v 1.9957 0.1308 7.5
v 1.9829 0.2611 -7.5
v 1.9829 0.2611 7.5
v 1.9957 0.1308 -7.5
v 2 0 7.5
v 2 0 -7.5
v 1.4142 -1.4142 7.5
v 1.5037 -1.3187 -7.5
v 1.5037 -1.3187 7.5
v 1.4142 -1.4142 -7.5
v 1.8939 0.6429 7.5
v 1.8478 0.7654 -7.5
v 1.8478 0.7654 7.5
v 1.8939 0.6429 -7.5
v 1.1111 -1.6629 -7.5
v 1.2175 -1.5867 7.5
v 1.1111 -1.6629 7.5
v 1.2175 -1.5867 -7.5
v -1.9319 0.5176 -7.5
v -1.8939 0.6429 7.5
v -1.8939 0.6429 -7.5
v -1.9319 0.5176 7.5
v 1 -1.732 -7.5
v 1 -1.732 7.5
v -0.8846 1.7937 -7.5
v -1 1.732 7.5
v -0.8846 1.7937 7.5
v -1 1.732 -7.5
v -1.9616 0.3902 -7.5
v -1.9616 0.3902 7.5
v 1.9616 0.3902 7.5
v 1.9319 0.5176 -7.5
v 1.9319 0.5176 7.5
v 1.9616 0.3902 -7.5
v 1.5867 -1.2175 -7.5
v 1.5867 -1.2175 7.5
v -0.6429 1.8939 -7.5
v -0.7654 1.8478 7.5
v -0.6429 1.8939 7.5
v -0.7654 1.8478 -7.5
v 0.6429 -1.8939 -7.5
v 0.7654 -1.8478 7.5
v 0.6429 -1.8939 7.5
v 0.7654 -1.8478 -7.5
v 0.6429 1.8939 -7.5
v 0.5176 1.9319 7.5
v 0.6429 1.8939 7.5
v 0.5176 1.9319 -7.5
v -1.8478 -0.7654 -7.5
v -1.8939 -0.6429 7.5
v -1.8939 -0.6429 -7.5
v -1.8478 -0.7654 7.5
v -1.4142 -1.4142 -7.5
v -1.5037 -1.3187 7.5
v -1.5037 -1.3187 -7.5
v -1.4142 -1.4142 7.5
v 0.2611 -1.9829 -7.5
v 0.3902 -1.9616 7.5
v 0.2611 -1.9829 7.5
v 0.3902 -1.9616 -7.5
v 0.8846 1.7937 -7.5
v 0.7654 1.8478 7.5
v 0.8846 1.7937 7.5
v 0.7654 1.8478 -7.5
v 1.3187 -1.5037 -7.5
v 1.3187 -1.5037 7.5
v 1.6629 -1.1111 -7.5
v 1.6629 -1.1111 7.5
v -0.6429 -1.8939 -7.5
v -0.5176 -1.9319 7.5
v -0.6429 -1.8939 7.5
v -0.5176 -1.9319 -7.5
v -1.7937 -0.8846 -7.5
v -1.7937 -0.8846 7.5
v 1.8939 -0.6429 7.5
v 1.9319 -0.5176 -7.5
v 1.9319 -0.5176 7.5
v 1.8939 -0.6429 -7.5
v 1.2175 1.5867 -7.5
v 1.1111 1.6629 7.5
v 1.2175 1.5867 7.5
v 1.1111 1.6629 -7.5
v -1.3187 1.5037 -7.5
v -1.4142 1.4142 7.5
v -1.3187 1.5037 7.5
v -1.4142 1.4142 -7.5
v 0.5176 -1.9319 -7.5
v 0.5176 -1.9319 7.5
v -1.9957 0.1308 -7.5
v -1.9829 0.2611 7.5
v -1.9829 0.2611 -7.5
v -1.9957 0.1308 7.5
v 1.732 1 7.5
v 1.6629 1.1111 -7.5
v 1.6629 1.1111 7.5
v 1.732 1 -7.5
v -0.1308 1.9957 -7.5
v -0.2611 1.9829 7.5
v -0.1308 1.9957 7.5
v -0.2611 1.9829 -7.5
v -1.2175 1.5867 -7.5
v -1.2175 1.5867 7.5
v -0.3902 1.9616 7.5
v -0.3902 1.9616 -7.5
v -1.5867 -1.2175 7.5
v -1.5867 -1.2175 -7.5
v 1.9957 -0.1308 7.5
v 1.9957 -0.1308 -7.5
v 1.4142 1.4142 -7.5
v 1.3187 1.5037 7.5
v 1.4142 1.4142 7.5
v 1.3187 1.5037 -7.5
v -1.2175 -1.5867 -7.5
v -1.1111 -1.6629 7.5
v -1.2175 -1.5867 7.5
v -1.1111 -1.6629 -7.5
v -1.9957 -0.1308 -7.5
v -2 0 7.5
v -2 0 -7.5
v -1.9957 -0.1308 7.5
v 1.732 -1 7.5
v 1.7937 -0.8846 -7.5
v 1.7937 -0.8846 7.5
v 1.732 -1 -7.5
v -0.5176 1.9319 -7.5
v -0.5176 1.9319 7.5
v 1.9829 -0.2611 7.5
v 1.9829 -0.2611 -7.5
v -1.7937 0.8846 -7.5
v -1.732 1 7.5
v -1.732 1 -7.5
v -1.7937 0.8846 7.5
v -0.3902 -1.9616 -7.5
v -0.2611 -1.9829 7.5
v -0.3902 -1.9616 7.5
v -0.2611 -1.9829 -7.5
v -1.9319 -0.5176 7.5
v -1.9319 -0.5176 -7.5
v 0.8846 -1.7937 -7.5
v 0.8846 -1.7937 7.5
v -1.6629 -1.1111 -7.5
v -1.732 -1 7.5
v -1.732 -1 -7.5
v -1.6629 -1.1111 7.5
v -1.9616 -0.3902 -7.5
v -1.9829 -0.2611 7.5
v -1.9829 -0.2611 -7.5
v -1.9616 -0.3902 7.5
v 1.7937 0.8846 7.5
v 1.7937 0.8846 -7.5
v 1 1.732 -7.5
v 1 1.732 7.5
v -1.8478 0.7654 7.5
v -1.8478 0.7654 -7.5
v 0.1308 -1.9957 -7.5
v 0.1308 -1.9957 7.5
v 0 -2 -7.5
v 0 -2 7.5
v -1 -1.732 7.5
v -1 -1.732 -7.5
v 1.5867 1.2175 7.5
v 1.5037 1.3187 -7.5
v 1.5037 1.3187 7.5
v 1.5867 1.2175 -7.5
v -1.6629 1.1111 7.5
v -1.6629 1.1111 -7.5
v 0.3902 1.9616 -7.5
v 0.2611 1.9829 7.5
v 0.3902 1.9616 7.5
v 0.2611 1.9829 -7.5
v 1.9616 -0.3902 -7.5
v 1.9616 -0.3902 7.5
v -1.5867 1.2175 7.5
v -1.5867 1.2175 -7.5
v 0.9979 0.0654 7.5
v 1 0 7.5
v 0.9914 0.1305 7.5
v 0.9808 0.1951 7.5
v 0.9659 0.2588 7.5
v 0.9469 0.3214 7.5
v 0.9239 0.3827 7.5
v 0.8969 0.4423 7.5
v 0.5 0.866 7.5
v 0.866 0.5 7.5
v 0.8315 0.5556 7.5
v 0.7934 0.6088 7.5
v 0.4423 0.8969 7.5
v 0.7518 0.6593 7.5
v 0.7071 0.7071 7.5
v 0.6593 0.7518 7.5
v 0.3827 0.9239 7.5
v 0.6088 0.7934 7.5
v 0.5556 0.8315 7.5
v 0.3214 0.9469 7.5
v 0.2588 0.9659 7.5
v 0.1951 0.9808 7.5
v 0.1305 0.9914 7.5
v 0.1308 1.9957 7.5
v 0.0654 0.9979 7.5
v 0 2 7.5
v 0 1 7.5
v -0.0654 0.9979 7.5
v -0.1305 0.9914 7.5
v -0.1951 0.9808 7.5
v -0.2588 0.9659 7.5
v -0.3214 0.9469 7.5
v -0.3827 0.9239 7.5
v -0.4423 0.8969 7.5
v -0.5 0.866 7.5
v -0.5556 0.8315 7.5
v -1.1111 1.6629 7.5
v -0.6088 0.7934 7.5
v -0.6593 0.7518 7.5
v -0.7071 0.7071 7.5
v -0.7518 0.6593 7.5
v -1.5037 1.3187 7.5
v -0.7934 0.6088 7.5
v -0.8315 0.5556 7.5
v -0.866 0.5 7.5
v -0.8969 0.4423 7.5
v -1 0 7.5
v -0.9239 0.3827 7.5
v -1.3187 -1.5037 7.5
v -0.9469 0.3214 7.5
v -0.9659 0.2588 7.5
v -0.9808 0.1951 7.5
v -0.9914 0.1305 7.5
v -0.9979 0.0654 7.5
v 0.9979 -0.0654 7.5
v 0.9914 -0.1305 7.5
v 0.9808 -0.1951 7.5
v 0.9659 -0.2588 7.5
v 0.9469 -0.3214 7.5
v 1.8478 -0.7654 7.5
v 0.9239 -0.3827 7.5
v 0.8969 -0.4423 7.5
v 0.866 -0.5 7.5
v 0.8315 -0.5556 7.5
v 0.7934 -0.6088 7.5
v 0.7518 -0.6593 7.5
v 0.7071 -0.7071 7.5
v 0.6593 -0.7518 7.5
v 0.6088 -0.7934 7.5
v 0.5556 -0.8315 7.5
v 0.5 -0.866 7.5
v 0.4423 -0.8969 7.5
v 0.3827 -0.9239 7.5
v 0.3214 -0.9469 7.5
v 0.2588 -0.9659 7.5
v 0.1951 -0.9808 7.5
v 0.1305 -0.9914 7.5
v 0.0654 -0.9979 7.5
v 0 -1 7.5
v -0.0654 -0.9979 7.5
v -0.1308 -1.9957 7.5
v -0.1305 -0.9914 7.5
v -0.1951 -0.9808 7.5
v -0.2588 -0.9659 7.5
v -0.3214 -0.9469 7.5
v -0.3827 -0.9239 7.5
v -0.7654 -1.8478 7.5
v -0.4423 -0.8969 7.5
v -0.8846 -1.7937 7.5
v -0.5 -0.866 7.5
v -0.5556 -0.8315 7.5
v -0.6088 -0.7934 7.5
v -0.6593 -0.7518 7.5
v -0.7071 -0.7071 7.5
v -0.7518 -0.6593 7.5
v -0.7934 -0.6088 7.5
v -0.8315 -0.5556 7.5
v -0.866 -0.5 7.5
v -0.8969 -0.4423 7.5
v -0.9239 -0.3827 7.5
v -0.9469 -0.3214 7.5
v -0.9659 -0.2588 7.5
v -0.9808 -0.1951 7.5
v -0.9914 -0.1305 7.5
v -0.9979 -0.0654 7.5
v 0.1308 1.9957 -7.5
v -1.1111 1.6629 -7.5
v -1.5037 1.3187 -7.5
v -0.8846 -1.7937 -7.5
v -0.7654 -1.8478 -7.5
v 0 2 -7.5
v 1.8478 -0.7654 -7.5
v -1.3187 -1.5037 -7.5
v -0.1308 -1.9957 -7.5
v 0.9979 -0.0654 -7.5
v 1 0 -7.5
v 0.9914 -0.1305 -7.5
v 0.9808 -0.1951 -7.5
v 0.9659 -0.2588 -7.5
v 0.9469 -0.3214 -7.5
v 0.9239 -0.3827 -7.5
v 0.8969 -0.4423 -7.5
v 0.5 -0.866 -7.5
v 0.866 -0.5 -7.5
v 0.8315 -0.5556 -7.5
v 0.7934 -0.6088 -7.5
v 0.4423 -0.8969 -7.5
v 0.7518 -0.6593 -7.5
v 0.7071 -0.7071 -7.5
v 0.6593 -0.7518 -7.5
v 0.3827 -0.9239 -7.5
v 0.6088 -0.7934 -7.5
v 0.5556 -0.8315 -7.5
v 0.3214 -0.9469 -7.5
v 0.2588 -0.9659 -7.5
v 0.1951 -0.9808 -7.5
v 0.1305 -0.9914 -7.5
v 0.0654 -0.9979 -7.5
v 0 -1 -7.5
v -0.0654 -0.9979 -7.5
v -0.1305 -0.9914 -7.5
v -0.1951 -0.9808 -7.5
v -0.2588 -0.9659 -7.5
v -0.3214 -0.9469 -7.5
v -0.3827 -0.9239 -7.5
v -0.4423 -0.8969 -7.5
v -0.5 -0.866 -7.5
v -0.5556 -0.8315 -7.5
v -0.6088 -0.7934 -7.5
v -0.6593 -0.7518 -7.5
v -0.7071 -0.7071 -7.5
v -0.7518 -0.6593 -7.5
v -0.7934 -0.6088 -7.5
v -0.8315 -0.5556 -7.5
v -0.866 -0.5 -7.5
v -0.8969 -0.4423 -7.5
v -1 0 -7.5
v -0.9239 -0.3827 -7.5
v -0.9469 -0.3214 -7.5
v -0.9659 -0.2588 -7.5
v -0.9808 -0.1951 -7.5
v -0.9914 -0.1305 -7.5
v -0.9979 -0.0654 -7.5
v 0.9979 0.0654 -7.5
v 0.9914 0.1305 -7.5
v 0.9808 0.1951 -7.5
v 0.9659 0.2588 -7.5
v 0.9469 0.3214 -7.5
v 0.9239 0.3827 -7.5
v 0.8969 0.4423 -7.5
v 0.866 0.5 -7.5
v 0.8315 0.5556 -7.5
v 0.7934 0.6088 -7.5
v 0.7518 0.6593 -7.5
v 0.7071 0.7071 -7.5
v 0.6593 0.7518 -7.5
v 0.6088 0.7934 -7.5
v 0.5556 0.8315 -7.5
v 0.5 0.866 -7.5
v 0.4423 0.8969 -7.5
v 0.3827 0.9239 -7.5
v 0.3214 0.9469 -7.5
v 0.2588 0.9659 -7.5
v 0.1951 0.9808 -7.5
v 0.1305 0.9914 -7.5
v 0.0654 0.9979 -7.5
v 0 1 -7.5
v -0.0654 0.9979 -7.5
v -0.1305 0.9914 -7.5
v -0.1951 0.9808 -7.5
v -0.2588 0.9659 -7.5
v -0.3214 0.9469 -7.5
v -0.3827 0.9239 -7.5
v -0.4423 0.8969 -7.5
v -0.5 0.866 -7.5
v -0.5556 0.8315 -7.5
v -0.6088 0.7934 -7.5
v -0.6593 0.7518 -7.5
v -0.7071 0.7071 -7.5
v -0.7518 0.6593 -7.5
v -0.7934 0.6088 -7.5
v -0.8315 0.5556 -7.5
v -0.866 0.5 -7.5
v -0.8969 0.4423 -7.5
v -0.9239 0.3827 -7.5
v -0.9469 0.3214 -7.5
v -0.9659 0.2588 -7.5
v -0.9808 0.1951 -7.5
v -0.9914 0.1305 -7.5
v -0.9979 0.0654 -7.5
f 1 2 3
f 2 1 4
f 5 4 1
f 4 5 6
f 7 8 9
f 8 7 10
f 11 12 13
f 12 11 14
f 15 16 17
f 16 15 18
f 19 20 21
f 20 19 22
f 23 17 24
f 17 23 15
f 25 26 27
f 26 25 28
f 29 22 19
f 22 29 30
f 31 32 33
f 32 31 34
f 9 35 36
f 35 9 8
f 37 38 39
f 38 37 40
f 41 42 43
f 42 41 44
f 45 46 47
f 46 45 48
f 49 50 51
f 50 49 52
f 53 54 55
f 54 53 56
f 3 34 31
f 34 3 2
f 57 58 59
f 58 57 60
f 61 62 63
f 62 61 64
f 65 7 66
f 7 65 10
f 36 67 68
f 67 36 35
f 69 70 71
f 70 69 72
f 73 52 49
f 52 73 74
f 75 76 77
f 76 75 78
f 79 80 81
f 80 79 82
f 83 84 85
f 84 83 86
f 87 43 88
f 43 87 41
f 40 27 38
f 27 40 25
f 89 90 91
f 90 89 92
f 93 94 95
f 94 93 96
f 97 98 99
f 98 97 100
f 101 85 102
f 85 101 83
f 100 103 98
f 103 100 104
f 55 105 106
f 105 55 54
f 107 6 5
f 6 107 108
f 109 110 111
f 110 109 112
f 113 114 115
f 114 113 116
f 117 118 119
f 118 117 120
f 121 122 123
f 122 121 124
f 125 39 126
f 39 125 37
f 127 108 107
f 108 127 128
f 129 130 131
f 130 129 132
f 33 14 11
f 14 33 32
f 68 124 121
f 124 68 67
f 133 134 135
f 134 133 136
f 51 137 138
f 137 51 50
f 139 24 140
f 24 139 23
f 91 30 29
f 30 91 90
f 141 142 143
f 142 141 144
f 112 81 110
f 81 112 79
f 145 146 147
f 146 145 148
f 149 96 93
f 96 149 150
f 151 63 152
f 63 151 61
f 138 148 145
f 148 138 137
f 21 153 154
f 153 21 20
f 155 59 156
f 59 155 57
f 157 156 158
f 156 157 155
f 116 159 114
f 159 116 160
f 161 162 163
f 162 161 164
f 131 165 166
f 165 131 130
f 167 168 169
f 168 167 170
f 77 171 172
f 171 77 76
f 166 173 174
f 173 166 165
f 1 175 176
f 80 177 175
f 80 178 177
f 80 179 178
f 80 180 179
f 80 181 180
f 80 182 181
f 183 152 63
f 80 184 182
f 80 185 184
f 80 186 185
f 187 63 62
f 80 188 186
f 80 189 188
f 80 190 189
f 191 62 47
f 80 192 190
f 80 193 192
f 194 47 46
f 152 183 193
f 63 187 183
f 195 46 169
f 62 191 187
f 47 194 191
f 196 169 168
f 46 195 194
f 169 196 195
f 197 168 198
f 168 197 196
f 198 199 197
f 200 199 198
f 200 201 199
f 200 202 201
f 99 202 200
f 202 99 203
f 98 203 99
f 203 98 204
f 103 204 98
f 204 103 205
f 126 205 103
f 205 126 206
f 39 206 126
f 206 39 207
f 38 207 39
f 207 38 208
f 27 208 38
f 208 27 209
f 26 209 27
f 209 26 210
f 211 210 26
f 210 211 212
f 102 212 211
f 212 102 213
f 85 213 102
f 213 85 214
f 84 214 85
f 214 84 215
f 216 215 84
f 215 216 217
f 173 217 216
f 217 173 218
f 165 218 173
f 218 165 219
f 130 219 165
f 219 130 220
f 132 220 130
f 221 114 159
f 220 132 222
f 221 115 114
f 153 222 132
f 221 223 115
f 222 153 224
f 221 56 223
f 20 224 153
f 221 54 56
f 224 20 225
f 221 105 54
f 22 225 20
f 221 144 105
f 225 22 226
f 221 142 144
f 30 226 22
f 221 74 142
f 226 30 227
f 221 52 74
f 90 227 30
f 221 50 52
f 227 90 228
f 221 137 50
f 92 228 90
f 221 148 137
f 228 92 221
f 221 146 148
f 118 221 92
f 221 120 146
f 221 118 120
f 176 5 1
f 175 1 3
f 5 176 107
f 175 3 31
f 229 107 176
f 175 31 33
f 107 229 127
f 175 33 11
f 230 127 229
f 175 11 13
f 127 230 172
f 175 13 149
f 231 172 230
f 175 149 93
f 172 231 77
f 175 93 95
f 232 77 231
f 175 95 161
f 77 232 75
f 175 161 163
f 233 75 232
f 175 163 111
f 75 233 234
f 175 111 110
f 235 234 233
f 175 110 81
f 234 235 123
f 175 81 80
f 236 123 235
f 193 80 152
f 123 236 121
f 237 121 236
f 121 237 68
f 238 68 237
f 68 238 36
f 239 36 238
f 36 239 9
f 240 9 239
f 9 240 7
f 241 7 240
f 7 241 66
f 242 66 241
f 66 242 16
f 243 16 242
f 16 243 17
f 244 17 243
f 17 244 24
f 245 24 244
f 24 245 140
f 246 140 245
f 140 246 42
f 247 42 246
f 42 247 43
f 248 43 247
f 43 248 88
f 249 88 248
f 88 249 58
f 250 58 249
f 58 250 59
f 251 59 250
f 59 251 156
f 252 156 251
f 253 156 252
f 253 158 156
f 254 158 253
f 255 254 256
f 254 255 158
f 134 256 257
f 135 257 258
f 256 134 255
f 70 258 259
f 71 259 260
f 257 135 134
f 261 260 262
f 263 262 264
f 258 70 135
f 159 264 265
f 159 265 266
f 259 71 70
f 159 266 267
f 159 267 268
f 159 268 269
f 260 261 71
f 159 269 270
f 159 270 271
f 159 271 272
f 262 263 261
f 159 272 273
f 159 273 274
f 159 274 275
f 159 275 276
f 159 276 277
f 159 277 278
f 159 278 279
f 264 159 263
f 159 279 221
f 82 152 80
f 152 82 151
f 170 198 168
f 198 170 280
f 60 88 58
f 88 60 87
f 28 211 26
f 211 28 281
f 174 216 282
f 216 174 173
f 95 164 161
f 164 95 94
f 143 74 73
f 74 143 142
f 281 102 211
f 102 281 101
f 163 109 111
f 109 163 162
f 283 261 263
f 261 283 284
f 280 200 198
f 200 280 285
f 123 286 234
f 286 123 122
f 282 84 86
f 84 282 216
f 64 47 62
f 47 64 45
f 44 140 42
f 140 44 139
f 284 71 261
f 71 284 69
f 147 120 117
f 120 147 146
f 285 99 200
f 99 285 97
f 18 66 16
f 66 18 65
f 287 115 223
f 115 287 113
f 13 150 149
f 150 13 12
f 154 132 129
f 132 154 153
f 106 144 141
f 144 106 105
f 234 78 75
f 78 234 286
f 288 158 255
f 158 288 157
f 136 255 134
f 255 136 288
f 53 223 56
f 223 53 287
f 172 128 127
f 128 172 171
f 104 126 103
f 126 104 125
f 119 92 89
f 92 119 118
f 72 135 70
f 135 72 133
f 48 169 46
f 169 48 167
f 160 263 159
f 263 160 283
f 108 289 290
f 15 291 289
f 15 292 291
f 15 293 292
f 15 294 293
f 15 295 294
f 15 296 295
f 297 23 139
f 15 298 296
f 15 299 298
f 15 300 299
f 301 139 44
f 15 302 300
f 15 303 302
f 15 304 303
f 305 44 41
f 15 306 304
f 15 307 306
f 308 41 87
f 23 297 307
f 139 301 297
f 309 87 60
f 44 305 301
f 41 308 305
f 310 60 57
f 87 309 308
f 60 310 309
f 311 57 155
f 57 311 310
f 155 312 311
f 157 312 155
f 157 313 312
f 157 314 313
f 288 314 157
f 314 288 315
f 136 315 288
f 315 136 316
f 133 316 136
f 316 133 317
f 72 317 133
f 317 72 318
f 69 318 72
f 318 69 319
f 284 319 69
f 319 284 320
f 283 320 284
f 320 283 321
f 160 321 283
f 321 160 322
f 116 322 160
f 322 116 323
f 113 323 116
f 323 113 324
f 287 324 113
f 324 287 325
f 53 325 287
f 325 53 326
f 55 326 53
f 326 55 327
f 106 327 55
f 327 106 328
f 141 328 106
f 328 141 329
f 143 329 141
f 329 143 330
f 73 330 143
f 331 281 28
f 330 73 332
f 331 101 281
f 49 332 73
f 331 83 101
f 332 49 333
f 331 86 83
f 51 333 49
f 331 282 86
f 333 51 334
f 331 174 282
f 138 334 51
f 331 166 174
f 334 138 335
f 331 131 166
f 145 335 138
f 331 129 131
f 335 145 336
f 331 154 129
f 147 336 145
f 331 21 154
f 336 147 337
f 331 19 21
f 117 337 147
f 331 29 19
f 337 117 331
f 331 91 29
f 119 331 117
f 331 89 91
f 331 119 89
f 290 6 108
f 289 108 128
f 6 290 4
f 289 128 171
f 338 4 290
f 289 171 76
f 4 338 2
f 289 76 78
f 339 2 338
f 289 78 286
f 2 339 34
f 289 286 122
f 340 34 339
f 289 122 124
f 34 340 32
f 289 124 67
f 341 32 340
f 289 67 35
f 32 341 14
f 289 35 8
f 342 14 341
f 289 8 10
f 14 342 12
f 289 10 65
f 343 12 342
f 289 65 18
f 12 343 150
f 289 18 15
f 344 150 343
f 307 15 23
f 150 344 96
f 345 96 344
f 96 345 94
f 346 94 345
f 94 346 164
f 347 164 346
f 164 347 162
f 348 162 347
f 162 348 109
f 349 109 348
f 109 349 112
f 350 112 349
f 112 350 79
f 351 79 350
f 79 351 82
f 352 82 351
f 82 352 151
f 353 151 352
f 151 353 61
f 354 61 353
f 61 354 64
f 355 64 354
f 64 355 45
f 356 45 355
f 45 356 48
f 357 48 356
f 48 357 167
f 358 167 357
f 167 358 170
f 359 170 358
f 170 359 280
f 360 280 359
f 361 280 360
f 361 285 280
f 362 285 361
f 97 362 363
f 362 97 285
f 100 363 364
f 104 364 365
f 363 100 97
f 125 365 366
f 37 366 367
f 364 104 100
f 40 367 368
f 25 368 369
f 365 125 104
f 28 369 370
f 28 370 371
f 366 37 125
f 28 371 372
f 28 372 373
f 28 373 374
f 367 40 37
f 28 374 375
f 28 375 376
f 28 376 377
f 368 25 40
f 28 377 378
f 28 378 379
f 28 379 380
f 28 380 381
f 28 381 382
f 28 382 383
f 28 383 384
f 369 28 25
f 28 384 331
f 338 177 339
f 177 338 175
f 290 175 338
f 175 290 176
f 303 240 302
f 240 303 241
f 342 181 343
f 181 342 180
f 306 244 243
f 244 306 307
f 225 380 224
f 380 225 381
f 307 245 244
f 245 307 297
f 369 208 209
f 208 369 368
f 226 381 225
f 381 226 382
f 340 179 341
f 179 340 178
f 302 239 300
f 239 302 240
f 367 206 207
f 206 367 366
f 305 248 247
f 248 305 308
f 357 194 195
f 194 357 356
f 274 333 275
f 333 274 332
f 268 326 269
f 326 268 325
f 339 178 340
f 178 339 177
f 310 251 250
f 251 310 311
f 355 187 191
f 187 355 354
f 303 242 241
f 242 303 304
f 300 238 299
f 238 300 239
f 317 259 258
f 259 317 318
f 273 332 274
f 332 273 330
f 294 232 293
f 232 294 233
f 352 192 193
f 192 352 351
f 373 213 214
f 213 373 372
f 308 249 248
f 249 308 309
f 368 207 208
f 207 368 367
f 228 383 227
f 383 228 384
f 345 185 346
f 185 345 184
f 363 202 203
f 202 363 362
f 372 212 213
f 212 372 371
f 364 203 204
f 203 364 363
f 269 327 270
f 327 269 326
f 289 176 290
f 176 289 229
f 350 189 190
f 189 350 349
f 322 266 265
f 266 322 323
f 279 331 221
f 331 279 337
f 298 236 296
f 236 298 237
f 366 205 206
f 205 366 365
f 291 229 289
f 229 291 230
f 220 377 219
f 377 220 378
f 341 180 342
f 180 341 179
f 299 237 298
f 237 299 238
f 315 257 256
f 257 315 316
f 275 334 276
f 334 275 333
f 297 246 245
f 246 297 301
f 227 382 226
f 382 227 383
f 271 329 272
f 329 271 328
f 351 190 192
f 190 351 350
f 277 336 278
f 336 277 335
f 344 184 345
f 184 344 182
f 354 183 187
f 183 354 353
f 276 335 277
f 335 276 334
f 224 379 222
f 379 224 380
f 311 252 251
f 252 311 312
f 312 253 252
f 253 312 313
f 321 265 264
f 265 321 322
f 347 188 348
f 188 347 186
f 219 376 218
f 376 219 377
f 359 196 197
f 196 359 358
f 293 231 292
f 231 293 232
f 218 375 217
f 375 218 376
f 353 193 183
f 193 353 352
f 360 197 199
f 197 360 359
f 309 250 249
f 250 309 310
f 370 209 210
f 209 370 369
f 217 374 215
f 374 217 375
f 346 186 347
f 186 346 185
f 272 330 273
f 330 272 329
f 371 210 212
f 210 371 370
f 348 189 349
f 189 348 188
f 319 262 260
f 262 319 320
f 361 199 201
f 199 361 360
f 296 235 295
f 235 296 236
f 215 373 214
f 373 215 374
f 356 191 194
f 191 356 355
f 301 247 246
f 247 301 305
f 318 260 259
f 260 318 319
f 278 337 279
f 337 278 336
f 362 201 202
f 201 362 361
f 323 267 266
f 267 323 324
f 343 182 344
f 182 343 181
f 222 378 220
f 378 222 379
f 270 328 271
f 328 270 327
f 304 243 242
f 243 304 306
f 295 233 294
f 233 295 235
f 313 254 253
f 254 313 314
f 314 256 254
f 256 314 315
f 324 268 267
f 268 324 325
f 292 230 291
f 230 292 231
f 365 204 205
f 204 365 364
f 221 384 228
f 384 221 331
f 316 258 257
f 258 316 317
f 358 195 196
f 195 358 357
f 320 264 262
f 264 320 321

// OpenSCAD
// PTFE Tubing (hollow cylindrical tube)

// Parameters
length = 15; //[8:30:1]
outer_diameter = 4; //[2:8:0.1]
inner_diameter = 2; //[1:6:0.1]
forced_id = 0; //[0:6:0.1]
center = 1; //[0:1:1]
path_length = 0; //[0:200:1]
eps = 0.2; //[0.01:1:0.01]

// Smoothness (avoid polygonal/hex look)
$fn = 96;

function tube_h() = (path_length > 0) ? path_length : length;
function tube_id() = (forced_id > 0) ? forced_id : inner_diameter;

module tubing(h, od, id) {
  // Ensure valid, printable tube wall and non-degenerate inner void
  wall_min = max(eps, 0.01);
  od2 = max(od, 2*wall_min + wall_min);
  id2 = min(max(id, wall_min), od2 - 2*wall_min);

  color([0.85, 0.85, 0.8])  // off-white PTFE
  difference() {
    cylinder(h=h, d=od2, center=true);
    cylinder(h=h + 2*wall_min, d=id2, center=true);
  }
}

module assembly() {
  h = tube_h();
  od = outer_diameter;
  id = tube_id();

  if (center == 1) {
    tubing(h, od, id);
  } else {
    translate([0, 0, h/2]) tubing(h, od, id); // base at Z=0
  }
}

assembly();
